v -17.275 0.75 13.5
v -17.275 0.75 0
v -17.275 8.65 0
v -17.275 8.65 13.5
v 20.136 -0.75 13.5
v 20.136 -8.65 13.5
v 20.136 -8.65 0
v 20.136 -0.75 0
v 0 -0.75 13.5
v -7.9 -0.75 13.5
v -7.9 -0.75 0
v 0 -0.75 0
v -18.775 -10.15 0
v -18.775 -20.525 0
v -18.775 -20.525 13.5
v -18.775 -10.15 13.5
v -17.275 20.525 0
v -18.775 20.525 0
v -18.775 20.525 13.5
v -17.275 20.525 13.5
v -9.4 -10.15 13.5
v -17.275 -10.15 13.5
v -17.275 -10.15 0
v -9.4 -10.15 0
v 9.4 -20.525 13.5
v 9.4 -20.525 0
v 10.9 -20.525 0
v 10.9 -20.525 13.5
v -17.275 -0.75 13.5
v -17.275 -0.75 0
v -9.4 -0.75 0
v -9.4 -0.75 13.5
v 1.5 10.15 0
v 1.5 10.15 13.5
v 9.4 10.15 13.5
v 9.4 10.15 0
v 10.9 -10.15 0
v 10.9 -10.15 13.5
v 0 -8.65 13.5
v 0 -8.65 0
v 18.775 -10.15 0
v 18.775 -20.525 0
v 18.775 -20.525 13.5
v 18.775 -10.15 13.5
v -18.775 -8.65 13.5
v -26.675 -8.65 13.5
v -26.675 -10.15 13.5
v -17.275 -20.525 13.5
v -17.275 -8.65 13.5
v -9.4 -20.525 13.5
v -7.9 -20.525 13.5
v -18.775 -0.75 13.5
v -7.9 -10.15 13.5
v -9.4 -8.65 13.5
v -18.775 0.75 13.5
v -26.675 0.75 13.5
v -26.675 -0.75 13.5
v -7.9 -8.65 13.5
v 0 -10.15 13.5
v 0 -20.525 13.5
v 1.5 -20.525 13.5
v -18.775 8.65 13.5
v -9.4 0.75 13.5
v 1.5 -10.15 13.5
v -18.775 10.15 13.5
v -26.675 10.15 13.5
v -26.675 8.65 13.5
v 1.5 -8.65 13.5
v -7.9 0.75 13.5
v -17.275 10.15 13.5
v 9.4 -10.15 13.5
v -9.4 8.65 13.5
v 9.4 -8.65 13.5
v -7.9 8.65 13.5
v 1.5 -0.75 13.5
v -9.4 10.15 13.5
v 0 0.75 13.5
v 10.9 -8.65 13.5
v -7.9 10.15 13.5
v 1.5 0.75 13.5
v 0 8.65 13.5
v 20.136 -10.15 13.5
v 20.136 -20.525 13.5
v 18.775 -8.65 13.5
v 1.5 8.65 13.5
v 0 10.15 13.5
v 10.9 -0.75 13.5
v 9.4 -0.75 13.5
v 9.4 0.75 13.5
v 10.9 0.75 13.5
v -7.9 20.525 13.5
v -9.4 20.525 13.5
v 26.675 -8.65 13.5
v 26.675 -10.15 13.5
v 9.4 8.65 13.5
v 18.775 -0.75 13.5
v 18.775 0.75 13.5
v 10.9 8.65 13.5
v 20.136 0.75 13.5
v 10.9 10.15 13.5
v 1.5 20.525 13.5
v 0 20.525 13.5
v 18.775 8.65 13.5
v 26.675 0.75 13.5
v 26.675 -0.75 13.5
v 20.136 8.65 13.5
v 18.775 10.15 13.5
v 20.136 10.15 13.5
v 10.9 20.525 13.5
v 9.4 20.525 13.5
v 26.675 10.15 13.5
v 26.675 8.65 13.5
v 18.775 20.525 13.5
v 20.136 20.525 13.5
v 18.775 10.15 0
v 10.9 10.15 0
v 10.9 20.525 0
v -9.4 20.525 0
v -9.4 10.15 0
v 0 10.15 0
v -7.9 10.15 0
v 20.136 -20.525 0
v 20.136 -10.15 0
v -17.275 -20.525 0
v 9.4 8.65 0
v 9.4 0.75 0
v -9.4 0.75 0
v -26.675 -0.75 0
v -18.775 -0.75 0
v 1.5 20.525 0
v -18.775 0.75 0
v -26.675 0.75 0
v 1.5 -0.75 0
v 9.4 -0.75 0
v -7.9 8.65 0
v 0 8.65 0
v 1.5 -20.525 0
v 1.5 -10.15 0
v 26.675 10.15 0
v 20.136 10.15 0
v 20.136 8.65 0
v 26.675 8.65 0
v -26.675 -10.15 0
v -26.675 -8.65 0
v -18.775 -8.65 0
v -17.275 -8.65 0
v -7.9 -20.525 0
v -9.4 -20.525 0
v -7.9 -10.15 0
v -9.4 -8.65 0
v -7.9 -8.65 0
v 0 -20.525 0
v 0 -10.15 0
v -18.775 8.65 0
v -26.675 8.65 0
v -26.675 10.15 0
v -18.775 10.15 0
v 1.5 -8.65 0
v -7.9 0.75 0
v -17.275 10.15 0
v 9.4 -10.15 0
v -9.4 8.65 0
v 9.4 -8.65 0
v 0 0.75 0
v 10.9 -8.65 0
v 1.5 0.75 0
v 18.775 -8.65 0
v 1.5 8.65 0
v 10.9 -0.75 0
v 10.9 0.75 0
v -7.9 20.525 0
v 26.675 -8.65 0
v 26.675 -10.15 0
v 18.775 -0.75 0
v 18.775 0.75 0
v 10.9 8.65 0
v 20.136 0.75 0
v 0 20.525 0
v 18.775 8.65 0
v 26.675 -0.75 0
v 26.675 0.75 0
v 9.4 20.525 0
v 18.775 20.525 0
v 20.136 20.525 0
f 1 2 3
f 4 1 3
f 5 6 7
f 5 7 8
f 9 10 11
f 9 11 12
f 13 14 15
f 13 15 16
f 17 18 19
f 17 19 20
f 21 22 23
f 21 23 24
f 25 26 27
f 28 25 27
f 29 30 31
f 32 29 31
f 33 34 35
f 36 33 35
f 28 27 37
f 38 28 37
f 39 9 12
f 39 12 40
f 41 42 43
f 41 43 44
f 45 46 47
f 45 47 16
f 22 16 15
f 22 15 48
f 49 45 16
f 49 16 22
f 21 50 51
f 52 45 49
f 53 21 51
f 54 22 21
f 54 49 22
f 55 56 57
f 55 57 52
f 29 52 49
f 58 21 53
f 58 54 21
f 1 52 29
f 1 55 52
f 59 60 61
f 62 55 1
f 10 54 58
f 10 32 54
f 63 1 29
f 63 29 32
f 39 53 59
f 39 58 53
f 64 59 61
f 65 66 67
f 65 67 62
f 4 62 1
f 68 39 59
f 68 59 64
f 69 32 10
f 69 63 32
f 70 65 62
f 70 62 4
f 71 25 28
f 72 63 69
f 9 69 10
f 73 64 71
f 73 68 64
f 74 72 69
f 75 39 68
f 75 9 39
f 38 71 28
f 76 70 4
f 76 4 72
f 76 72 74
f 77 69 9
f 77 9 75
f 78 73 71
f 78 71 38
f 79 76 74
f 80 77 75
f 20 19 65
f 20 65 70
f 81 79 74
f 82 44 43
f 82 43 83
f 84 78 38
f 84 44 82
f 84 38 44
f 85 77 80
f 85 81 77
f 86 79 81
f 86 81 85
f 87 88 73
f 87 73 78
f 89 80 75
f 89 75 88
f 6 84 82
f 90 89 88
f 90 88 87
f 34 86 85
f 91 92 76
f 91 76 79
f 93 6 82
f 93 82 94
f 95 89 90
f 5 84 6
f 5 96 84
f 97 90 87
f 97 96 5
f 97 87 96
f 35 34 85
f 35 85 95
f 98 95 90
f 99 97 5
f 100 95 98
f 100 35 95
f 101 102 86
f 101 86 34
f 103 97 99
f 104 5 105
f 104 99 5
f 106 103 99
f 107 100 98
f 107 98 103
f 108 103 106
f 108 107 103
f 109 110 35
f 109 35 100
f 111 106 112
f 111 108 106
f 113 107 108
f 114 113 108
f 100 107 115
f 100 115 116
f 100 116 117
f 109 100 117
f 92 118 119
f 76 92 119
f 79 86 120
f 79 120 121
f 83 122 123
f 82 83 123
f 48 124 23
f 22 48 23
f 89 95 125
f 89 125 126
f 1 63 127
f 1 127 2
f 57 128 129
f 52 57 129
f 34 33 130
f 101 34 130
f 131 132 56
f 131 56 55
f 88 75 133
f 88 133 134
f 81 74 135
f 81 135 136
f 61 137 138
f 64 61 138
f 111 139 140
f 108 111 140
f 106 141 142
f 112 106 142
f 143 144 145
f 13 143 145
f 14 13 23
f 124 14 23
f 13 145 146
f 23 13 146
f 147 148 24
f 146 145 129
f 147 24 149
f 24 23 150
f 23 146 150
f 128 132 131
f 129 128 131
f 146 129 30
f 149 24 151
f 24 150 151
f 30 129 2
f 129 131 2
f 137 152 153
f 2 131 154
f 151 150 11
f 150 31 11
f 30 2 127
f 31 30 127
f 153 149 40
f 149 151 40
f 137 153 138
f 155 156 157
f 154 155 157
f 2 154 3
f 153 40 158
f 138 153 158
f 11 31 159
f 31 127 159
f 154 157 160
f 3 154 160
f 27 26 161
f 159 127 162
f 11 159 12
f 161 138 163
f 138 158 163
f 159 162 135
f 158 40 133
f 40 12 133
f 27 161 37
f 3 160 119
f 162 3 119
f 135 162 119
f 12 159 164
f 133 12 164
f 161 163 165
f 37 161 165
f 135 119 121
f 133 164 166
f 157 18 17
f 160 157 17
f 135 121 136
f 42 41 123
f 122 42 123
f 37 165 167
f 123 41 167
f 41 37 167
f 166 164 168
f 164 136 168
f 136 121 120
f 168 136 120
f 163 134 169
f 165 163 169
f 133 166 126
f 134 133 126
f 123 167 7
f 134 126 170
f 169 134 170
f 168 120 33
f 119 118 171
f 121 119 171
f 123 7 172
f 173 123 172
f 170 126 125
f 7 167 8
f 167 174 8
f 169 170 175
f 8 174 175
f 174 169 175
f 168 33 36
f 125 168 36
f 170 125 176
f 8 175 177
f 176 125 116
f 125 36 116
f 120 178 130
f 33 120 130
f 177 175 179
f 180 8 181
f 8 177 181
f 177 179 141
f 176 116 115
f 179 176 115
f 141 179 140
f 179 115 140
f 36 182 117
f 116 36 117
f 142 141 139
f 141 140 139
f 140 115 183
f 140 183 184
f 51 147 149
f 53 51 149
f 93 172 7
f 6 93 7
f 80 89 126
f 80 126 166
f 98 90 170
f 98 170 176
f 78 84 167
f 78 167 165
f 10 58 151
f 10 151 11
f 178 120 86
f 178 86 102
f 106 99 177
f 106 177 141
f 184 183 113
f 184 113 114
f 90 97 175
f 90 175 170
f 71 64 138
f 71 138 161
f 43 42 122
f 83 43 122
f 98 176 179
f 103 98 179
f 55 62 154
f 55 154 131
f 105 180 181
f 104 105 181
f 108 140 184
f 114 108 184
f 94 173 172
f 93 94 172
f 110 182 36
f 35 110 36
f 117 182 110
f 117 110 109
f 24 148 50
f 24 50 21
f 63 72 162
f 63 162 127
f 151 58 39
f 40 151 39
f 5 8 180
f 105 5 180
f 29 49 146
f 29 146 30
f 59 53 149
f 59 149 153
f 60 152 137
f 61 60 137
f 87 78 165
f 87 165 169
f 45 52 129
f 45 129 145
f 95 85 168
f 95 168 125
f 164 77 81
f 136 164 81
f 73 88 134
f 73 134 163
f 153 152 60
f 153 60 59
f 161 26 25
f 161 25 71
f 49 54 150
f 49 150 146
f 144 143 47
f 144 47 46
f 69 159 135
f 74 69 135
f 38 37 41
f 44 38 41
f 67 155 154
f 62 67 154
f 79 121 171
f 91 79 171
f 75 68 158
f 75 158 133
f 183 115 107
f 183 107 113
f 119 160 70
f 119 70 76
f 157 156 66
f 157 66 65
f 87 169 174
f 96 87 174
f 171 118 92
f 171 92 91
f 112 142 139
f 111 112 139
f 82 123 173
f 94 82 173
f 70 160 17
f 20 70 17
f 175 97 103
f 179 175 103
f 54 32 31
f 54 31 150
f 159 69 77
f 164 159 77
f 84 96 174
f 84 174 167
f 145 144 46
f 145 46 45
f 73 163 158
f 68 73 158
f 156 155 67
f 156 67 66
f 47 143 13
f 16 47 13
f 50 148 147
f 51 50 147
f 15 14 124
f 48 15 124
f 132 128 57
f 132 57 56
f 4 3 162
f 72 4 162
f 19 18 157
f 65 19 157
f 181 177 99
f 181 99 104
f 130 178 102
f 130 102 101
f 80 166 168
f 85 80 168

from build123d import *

# Parameters (mm, degrees)
F0_W     = 1.5
F0_H     = 10.375
F0_H_2   = 1.5
F0_W_2   = 7.9
F0_H_3   = 7.9
F0_W_3   = 7.875
F0_W_4   = 1.360903731
F0_W_5   = 6.539096269
F1_DEPTH = 13.5


with BuildPart() as f1:
    # F0 (on Top) → F1 (new body)
    with BuildSketch(Plane.XY):
        with Locations((-18.025, 15.3375)):
            Rectangle(F0_W, F0_H)
        with Locations((-18.025, 9.4)):
            Rectangle(F0_W, F0_H_2)
        with Locations((-22.725, 9.4)):
            Rectangle(F0_W_2, F0_H_2)
        with Locations((-18.025, 4.7)):
            Rectangle(F0_W, F0_H_3)
        with Locations((-18.025, 0)):
            Rectangle(F0_W, F0_H_2)
        with Locations((-22.725, 0)):
            Rectangle(F0_W_2, F0_H_2)
        with Locations((-18.025, -4.7)):
            Rectangle(F0_W, F0_H_3)
        with Locations((-18.025, -9.4)):
            Rectangle(F0_W, F0_H_2)
        with Locations((-22.725, -9.4)):
            Rectangle(F0_W_2, F0_H_2)
        with Locations((-18.025, -15.3375)):
            Rectangle(F0_W, F0_H)
        with Locations((-13.3375, -9.4)):
            Rectangle(F0_W_3, F0_H_2)
        with Locations((-8.65, -9.4)):
            Rectangle(F0_W, F0_H_2)
        with Locations((-8.65, -4.7)):
            Rectangle(F0_W, F0_H_3)
        with Locations((-8.65, 0)):
            Rectangle(F0_W, F0_H_2)
        with Locations((-13.3375, 0)):
            Rectangle(F0_W_3, F0_H_2)
        with Locations((-8.65, -15.3375)):
            Rectangle(F0_W, F0_H)
        with Locations((-8.65, 15.3375)):
            Rectangle(F0_W, F0_H)
        with Locations((-8.65, 9.4)):
            Rectangle(F0_W, F0_H_2)
        with Locations((-8.65, 4.7)):
            Rectangle(F0_W, F0_H_3)
        with Locations((-13.3375, 9.4)):
            Rectangle(F0_W_3, F0_H_2)
        with Locations((-3.95, 9.4)):
            Rectangle(F0_W_2, F0_H_2)
        with Locations((0.75, 9.4)):
            Rectangle(F0_W, F0_H_2)
        with Locations((0.75, 15.3375)):
            Rectangle(F0_W, F0_H)
        with Locations((0.75, 4.7)):
            Rectangle(F0_W, F0_H_3)
        with Locations((-3.95, 0)):
            Rectangle(F0_W_2, F0_H_2)
        with Locations((0.75, 0)):
            Rectangle(F0_W, F0_H_2)
        with Locations((0.75, -4.7)):
            Rectangle(F0_W, F0_H_3)
        with Locations((0.75, -9.4)):
            Rectangle(F0_W, F0_H_2)
        with Locations((-3.95, -9.4)):
            Rectangle(F0_W_2, F0_H_2)
        with Locations((0.75, -15.3375)):
            Rectangle(F0_W, F0_H)
        with Locations((5.45, -9.4)):
            Rectangle(F0_W_2, F0_H_2)
        with Locations((10.15, -15.3375)):
            Rectangle(F0_W, F0_H)
        with Locations((19.4554518655, -15.3375)):
            Rectangle(F0_W_4, F0_H)
        with Locations((23.4054518655, -9.4)):
            Rectangle(F0_W_5, F0_H_2)
        with Locations((14.8375, -9.4)):
            Rectangle(F0_W_3, F0_H_2)
        with Locations((19.4554518655, -9.4)):
            Rectangle(F0_W_4, F0_H_2)
        with Locations((10.15, -9.4)):
            Rectangle(F0_W, F0_H_2)
        with Locations((10.15, -4.7)):
            Rectangle(F0_W, F0_H_3)
        with Locations((19.4554518655, -4.7)):
            Rectangle(F0_W_4, F0_H_3)
        with Locations((19.4554518655, 0)):
            Rectangle(F0_W_4, F0_H_2)
        with Locations((14.8375, 0)):
            Rectangle(F0_W_3, F0_H_2)
        with Locations((10.15, 0)):
            Rectangle(F0_W, F0_H_2)
        with Locations((5.45, 0)):
            Rectangle(F0_W_2, F0_H_2)
        with Locations((19.4554518655, 4.7)):
            Rectangle(F0_W_4, F0_H_3)
        with Locations((10.15, 4.7)):
            Rectangle(F0_W, F0_H_3)
        with Locations((23.4054518655, 0)):
            Rectangle(F0_W_5, F0_H_2)
        with Locations((23.4054518655, 9.4)):
            Rectangle(F0_W_5, F0_H_2)
        with Locations((14.8375, 9.4)):
            Rectangle(F0_W_3, F0_H_2)
        with Locations((19.4554518655, 9.4)):
            Rectangle(F0_W_4, F0_H_2)
        with Locations((19.4554518655, 15.3375)):
            Rectangle(F0_W_4, F0_H)
        with Locations((10.15, 15.3375)):
            Rectangle(F0_W, F0_H)
        with Locations((10.15, 9.4)):
            Rectangle(F0_W, F0_H_2)
        with Locations((5.45, 9.4)):
            Rectangle(F0_W_2, F0_H_2)
    extrude(amount=F1_DEPTH)


solid = f1.part
